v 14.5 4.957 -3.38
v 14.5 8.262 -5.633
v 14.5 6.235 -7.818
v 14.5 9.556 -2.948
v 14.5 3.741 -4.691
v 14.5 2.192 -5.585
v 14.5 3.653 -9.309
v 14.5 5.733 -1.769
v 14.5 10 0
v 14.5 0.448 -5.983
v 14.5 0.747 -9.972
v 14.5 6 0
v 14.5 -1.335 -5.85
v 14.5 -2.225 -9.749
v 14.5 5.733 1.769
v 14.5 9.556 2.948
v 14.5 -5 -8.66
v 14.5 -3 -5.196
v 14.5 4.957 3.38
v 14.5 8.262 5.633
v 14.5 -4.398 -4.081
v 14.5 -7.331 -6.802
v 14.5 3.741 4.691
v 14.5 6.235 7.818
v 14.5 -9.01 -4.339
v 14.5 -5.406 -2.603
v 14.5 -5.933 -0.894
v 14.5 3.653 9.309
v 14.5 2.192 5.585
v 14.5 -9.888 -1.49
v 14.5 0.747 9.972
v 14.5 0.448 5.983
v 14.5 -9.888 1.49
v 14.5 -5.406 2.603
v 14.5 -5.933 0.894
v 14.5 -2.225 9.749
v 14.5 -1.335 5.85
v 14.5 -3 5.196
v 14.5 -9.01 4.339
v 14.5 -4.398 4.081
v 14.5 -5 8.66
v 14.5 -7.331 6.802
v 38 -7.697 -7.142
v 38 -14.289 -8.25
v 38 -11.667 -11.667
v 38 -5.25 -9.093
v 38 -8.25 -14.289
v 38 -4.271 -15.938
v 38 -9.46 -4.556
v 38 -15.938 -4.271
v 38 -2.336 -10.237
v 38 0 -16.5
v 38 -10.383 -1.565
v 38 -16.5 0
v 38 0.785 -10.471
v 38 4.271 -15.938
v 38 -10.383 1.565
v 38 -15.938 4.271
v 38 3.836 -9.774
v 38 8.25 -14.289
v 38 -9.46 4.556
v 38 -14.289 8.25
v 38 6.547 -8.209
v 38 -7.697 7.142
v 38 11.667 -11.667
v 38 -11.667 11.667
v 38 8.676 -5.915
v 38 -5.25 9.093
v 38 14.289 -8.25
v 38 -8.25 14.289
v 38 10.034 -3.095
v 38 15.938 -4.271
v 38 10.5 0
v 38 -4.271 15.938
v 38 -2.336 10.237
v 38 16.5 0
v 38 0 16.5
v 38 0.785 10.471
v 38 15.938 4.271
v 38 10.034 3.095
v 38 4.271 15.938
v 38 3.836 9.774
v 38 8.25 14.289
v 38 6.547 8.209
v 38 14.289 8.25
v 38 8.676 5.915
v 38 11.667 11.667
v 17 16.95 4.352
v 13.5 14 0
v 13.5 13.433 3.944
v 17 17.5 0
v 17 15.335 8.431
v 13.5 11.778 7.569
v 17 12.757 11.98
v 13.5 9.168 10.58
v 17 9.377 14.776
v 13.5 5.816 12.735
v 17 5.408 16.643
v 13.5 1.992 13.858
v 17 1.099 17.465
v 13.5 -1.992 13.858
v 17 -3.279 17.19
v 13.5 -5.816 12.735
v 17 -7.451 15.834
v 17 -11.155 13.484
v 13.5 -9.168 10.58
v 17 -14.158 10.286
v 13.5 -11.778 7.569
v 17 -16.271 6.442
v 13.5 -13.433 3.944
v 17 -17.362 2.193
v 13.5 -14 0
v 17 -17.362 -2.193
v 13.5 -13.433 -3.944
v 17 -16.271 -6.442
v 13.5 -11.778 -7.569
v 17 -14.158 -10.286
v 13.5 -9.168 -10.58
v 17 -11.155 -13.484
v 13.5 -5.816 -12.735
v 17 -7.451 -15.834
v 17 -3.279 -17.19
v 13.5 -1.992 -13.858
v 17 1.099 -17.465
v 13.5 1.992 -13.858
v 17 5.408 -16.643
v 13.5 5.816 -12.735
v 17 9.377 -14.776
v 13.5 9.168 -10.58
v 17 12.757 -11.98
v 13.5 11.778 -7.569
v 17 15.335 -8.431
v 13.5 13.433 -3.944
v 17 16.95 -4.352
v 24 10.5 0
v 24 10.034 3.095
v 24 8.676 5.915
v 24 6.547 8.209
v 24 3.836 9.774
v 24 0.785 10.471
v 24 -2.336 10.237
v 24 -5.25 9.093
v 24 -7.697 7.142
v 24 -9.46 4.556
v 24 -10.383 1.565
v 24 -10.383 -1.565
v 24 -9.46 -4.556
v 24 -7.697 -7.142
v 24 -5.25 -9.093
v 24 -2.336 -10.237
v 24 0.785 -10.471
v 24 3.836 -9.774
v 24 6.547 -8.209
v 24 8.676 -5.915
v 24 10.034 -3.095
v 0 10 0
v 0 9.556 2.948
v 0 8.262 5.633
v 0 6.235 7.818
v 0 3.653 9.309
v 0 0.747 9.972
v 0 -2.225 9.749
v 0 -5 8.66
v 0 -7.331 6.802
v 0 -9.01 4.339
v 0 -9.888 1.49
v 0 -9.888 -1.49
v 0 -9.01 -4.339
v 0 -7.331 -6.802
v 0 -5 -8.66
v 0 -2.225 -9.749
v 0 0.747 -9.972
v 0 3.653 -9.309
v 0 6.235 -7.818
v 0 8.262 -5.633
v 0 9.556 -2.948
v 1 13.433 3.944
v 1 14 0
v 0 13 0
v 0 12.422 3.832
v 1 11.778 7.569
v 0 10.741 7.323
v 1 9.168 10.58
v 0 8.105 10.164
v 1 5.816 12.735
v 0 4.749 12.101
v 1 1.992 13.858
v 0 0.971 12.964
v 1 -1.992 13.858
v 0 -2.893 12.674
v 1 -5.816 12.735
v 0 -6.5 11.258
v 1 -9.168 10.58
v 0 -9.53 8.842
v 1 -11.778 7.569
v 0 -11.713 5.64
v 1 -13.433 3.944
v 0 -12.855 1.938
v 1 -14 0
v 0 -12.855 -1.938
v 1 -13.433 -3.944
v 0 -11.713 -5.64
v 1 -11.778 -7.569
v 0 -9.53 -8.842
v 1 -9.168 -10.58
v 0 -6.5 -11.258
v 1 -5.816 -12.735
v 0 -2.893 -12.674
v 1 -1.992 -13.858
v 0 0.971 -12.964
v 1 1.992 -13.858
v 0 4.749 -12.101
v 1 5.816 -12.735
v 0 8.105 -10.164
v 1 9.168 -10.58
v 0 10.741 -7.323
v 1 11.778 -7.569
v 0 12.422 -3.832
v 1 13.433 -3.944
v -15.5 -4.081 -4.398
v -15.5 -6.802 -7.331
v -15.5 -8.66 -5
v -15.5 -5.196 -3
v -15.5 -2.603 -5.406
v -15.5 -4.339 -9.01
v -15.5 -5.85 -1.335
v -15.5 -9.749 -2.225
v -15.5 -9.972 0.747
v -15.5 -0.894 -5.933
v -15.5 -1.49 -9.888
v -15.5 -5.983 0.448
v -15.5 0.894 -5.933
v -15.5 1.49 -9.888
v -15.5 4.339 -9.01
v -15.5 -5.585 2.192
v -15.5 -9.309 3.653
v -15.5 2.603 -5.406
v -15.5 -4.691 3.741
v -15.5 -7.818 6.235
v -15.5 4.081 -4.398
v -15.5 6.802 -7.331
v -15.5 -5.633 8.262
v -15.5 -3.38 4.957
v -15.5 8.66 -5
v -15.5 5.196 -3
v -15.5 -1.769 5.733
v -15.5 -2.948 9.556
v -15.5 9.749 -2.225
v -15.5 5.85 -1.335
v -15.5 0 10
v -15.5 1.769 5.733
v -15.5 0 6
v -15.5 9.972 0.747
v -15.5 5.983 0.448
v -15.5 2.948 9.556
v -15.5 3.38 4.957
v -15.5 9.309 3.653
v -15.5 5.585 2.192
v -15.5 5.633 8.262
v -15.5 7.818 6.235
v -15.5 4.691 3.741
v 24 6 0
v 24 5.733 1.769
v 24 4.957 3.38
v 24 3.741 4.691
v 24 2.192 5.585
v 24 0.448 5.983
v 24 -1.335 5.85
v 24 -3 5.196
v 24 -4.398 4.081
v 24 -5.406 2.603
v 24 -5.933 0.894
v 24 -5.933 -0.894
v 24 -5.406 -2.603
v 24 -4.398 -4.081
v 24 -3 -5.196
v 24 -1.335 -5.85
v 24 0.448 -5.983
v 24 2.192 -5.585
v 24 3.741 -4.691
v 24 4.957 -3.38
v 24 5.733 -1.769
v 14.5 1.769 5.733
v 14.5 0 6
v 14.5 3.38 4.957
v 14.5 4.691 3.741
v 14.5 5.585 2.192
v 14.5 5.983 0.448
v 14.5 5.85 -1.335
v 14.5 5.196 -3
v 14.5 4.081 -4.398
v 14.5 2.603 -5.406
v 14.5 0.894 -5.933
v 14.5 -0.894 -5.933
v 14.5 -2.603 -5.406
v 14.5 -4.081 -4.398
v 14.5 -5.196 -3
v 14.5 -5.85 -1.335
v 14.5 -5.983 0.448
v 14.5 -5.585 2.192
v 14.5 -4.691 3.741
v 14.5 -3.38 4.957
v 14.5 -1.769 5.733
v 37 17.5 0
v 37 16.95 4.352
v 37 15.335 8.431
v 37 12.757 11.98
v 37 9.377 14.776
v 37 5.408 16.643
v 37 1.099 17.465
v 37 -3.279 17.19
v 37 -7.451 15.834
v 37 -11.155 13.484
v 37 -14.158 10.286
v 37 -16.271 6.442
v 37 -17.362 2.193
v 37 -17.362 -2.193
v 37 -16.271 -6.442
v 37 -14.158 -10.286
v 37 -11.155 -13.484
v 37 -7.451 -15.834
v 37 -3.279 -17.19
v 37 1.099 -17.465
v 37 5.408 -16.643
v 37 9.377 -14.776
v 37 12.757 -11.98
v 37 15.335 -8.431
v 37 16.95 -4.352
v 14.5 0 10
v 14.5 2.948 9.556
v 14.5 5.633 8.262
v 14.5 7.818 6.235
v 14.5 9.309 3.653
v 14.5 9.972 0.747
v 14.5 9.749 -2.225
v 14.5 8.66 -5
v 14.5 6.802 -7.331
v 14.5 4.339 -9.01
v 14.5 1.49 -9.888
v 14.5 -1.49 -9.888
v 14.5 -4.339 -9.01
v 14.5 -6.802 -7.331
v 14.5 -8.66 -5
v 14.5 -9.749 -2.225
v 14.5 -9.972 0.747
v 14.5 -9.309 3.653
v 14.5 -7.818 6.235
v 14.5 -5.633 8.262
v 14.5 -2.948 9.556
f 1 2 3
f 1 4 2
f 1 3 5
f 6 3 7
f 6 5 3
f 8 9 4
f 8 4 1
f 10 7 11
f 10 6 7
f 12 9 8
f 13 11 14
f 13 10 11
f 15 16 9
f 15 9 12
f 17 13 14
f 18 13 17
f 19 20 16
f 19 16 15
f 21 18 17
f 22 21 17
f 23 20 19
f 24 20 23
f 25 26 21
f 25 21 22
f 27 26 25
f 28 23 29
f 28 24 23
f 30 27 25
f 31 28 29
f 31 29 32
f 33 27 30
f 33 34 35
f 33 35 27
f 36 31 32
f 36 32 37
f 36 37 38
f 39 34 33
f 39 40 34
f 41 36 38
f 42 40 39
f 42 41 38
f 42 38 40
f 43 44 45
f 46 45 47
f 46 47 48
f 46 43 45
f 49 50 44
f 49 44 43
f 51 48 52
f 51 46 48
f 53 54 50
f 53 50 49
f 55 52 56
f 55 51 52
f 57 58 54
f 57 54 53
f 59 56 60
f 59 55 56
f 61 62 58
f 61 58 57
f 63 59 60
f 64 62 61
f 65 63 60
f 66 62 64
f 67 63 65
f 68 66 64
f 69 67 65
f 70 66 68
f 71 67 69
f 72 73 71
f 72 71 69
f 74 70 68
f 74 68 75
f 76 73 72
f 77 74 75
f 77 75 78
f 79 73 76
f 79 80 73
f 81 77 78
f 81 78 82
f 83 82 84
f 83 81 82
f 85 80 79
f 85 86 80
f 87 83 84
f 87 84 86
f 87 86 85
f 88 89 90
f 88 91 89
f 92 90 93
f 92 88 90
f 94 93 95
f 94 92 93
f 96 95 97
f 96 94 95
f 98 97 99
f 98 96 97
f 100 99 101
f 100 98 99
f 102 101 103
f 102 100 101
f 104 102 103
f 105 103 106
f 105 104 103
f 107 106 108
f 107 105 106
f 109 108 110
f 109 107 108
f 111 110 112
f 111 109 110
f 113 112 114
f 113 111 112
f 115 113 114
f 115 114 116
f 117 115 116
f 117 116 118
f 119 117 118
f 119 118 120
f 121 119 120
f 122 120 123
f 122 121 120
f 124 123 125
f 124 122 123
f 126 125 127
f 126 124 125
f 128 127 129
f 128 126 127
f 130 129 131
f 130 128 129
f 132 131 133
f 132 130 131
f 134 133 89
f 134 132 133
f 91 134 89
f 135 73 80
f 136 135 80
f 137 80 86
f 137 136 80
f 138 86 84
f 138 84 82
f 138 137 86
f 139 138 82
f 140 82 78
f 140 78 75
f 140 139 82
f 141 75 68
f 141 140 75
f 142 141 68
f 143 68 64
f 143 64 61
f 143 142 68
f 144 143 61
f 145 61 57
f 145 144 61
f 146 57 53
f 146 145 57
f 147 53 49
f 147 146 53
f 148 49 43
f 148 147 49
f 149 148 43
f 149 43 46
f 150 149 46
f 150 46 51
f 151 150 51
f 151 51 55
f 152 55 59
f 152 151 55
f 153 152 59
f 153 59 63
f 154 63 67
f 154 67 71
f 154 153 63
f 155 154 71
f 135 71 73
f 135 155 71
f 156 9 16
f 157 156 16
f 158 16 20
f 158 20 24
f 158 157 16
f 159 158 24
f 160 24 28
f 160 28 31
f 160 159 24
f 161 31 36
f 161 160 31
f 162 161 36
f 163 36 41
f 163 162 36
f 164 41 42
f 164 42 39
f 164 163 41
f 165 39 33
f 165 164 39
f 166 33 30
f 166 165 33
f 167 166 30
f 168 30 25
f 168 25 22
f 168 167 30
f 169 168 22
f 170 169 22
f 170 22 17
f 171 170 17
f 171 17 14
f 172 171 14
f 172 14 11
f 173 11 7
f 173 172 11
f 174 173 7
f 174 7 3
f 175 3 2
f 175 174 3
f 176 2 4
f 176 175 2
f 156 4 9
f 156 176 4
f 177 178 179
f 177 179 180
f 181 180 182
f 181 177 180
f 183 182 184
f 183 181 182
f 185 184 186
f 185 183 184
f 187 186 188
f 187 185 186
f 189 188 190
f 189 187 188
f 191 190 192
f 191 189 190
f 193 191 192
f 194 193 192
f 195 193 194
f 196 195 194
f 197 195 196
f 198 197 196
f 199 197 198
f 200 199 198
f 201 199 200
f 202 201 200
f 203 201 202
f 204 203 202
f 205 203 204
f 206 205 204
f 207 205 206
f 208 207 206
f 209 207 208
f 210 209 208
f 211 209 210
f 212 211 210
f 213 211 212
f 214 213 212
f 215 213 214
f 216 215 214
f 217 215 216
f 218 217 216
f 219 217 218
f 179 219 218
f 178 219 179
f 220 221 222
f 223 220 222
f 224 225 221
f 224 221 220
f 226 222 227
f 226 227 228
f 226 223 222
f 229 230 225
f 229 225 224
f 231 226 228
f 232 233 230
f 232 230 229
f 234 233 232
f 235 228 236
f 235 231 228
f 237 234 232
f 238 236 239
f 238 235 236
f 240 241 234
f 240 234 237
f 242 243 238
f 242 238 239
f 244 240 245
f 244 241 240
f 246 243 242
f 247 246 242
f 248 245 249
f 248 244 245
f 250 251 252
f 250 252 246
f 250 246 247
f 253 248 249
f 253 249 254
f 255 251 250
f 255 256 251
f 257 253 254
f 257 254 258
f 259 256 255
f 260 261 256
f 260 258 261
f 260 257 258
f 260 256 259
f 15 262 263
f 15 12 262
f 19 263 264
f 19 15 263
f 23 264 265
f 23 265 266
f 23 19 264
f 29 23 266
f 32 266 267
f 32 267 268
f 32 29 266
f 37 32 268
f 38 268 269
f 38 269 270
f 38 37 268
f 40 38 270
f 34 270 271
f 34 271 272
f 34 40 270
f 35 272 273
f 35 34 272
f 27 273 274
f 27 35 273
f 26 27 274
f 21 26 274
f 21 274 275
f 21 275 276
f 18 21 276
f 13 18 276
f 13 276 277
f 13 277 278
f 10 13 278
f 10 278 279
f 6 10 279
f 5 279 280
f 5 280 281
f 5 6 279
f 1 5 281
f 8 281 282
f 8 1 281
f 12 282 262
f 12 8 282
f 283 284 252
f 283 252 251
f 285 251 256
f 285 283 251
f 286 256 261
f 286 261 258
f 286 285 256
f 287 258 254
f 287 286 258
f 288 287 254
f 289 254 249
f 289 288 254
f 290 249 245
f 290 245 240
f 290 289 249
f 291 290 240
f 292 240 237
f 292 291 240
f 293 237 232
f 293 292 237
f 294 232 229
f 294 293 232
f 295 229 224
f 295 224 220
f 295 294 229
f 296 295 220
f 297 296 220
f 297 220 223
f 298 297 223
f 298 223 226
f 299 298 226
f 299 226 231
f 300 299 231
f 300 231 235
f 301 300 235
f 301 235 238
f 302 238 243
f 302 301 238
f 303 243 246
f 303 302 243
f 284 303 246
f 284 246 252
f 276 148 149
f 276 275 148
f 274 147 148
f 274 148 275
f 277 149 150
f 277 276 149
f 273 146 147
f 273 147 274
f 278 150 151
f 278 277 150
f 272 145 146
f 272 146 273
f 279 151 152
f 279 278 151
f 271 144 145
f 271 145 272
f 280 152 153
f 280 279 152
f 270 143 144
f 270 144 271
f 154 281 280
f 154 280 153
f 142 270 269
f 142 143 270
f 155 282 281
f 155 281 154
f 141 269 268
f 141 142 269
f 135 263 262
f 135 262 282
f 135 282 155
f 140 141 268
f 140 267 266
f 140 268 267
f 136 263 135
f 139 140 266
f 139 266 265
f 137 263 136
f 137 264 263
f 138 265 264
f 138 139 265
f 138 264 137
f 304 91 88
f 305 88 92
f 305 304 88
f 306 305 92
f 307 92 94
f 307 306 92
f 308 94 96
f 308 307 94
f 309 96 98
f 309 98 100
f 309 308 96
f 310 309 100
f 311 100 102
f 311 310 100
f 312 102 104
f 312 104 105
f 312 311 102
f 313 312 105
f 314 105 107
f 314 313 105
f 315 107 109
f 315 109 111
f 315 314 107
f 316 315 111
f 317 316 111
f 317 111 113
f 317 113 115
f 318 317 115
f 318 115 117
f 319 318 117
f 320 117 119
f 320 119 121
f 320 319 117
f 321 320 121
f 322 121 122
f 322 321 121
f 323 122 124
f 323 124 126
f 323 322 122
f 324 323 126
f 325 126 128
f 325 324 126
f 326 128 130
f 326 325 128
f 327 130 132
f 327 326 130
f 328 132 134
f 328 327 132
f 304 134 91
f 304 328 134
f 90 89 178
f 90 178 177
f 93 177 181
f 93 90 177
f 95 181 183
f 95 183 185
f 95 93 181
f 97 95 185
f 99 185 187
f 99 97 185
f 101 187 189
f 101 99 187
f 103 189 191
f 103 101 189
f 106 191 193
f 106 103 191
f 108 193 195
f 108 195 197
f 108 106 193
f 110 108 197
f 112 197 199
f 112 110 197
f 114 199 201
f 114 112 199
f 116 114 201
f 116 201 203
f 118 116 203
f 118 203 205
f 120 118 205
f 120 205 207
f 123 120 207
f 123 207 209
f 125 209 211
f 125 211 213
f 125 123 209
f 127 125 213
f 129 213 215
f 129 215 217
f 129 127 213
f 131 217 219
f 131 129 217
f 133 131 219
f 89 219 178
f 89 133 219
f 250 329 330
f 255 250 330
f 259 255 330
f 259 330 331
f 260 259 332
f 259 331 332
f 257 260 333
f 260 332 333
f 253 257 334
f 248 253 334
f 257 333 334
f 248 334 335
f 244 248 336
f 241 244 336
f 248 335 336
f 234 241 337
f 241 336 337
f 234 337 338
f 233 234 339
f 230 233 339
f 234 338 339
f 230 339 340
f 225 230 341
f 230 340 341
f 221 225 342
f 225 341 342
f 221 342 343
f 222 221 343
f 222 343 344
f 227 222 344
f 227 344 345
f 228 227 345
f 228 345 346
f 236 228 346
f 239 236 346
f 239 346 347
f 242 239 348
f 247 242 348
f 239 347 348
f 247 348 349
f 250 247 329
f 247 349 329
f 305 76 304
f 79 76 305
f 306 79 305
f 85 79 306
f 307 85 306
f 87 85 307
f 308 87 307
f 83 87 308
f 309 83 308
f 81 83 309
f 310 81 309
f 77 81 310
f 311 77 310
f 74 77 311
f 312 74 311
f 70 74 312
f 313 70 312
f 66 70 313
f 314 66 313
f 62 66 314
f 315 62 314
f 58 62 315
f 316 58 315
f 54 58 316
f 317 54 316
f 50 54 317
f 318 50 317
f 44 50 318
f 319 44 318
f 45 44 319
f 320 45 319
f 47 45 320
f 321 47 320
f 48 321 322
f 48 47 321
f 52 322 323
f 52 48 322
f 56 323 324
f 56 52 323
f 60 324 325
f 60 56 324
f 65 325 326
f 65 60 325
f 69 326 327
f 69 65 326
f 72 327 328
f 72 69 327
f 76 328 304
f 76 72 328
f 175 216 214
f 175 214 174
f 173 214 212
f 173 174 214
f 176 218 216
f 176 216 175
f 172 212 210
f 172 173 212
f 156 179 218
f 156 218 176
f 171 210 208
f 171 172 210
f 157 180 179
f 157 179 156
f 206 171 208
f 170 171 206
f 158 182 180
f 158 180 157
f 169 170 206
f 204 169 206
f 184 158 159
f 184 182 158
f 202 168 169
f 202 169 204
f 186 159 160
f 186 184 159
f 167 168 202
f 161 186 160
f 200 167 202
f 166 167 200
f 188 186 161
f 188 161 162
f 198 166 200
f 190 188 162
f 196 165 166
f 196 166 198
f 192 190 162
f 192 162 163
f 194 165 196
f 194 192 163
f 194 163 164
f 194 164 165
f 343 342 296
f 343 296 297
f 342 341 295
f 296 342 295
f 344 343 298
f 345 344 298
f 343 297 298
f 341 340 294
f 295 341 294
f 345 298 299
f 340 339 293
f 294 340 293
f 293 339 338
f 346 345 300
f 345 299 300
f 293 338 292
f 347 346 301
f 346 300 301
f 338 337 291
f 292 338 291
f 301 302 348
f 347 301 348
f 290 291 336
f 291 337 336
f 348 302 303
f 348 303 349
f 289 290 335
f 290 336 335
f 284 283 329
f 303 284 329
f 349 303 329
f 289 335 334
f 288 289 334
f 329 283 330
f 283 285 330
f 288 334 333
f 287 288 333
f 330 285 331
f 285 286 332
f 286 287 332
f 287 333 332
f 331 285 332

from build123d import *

# Parameters (mm, degrees)
CHAMFER1_SIZE       = 1
SKETCH2_R           = 10
SKETCH2_R_2         = 6
BOSS_EXTRUDE1_DEPTH = 30


with BuildPart() as part:
    # Sketch1 → Revolve1 (revolve)
    with BuildSketch(Plane.XY):
        Polygon((0, 10), (0, 14), (13.5, 14), (17, 17.5), (38, 17.5), (38, 10.5), (24, 10.5), (24, 6), (14.5, 6), (14.5, 10), align=None)
    revolve(axis=Axis((0, 0, 0), (1, 0, 0)))

    # Chamfer1
    chamfer1_edges = [part.edges().sort_by_distance(p)[0] for p in [
        (38, -17.5, 0),
        (0, -14, 0),
    ]]
    chamfer(chamfer1_edges, length=CHAMFER1_SIZE)


with BuildPart() as body_2:
    # Sketch2 → Boss-Extrude1 (new body)
    with BuildSketch(Plane.ZY.offset(-14.5)):
        Circle(SKETCH2_R)
        Circle(SKETCH2_R_2, mode=Mode.SUBTRACT)
    extrude(amount=BOSS_EXTRUDE1_DEPTH)


solid = Compound([part.part, body_2.part])
